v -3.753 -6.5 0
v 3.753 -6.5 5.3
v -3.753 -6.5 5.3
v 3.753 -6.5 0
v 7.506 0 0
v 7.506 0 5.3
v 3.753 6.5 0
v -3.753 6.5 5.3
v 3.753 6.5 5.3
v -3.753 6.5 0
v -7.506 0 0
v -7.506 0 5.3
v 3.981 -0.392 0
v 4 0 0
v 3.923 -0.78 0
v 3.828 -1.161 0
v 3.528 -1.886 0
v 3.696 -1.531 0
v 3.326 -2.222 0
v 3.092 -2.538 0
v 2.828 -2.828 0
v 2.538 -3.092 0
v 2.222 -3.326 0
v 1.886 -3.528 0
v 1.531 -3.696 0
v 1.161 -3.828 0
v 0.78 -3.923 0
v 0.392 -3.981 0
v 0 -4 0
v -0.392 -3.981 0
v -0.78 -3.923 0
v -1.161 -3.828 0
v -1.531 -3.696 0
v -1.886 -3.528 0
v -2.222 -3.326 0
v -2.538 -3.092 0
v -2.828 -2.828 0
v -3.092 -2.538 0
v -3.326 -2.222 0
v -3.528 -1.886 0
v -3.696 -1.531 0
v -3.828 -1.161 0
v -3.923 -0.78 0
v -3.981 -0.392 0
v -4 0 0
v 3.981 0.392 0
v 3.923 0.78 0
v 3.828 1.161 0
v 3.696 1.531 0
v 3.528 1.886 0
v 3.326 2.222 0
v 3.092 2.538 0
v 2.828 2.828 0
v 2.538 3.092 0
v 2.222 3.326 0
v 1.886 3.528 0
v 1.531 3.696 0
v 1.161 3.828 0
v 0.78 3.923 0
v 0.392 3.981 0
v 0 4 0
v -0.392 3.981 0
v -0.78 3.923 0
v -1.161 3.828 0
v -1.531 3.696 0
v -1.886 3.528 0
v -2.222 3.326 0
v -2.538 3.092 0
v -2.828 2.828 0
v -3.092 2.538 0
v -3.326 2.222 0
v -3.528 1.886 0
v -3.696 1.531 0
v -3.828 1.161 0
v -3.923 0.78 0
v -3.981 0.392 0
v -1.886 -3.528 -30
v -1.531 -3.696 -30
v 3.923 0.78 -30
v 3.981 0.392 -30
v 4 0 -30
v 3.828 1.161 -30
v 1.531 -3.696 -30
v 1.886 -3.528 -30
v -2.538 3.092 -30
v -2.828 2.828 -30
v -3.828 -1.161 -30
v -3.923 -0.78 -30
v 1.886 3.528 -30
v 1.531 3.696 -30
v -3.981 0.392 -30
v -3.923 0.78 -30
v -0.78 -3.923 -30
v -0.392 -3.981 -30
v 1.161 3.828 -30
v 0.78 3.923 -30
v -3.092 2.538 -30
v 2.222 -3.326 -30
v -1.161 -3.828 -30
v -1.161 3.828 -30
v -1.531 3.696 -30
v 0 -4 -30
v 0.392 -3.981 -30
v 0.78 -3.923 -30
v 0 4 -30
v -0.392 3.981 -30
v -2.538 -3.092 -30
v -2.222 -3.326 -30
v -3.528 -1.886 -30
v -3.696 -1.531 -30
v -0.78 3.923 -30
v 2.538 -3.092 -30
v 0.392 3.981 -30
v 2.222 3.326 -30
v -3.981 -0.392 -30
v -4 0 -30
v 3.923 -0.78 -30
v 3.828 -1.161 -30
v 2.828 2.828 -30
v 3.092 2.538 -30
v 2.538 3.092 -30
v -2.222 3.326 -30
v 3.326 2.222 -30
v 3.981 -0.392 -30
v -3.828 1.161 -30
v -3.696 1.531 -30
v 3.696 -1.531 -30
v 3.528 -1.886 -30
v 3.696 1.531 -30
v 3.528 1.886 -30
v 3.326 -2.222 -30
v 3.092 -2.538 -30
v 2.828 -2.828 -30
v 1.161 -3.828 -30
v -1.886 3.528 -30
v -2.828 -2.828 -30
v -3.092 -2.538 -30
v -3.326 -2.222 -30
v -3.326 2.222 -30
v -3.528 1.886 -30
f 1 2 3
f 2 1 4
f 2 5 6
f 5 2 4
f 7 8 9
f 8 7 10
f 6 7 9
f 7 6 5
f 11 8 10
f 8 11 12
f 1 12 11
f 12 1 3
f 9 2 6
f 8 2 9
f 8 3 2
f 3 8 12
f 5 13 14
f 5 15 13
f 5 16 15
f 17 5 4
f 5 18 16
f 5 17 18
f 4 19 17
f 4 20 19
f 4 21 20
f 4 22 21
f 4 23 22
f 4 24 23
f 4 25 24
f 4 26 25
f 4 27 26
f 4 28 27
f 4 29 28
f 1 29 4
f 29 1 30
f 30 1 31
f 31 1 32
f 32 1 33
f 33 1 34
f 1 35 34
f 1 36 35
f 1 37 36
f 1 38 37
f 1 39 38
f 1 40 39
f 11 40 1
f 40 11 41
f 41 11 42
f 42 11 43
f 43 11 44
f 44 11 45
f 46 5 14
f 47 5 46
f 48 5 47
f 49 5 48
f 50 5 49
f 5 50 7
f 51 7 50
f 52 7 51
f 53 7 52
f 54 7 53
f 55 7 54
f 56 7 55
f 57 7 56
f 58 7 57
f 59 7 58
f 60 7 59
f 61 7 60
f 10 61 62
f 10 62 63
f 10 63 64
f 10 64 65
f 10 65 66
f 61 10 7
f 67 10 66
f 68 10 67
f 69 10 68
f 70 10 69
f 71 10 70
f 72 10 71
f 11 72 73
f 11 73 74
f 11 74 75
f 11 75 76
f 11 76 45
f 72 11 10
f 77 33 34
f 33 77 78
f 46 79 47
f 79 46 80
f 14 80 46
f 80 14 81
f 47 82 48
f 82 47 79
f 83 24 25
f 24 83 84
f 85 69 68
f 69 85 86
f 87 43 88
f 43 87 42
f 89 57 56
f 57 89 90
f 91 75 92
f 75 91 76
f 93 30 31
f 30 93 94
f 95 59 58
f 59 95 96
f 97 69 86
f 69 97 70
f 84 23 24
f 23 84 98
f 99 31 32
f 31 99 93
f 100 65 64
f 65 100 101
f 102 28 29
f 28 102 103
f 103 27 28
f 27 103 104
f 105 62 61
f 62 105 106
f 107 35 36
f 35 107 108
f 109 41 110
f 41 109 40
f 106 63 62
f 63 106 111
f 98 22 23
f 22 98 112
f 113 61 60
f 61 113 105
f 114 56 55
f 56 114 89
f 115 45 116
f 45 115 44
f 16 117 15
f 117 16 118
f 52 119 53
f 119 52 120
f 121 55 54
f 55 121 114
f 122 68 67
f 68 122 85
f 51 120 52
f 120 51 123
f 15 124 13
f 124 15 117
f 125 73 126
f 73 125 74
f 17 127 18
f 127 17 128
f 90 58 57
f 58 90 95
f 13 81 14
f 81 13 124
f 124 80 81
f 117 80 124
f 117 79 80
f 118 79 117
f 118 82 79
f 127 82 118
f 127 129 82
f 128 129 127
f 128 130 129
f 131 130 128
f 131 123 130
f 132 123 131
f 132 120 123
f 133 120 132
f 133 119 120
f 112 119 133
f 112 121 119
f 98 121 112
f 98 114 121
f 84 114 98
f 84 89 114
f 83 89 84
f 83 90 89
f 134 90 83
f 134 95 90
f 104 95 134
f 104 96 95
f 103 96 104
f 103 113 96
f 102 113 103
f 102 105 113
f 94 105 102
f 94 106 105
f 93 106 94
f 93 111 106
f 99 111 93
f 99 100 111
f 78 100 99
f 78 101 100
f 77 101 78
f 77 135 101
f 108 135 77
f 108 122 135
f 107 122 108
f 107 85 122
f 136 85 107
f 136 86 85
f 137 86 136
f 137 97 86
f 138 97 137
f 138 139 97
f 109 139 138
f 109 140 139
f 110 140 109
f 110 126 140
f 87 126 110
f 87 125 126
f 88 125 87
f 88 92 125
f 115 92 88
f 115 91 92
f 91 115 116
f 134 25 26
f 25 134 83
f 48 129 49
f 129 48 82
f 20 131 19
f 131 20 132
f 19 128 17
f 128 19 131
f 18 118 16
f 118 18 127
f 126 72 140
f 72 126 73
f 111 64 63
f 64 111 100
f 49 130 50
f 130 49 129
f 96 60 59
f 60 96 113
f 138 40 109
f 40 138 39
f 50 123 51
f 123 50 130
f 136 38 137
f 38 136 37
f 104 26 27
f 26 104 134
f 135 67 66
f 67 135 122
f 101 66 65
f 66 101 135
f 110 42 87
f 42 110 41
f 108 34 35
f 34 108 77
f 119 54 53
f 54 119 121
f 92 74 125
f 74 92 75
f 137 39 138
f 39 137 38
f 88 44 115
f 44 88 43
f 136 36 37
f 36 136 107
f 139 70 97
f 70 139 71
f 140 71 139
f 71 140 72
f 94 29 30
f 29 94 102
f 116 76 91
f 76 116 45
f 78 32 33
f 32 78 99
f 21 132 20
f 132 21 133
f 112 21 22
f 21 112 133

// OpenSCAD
$fn = 64;

// 頭部 (対辺13mm, 高さ5.3mm)
cylinder(r = (13 / 2) / cos(30), h = 5.3, $fn = 6);

// シャンク (直径8mm, 長さ30mm)
translate([0, 0, -30])
    cylinder(d = 8, h = 30);
